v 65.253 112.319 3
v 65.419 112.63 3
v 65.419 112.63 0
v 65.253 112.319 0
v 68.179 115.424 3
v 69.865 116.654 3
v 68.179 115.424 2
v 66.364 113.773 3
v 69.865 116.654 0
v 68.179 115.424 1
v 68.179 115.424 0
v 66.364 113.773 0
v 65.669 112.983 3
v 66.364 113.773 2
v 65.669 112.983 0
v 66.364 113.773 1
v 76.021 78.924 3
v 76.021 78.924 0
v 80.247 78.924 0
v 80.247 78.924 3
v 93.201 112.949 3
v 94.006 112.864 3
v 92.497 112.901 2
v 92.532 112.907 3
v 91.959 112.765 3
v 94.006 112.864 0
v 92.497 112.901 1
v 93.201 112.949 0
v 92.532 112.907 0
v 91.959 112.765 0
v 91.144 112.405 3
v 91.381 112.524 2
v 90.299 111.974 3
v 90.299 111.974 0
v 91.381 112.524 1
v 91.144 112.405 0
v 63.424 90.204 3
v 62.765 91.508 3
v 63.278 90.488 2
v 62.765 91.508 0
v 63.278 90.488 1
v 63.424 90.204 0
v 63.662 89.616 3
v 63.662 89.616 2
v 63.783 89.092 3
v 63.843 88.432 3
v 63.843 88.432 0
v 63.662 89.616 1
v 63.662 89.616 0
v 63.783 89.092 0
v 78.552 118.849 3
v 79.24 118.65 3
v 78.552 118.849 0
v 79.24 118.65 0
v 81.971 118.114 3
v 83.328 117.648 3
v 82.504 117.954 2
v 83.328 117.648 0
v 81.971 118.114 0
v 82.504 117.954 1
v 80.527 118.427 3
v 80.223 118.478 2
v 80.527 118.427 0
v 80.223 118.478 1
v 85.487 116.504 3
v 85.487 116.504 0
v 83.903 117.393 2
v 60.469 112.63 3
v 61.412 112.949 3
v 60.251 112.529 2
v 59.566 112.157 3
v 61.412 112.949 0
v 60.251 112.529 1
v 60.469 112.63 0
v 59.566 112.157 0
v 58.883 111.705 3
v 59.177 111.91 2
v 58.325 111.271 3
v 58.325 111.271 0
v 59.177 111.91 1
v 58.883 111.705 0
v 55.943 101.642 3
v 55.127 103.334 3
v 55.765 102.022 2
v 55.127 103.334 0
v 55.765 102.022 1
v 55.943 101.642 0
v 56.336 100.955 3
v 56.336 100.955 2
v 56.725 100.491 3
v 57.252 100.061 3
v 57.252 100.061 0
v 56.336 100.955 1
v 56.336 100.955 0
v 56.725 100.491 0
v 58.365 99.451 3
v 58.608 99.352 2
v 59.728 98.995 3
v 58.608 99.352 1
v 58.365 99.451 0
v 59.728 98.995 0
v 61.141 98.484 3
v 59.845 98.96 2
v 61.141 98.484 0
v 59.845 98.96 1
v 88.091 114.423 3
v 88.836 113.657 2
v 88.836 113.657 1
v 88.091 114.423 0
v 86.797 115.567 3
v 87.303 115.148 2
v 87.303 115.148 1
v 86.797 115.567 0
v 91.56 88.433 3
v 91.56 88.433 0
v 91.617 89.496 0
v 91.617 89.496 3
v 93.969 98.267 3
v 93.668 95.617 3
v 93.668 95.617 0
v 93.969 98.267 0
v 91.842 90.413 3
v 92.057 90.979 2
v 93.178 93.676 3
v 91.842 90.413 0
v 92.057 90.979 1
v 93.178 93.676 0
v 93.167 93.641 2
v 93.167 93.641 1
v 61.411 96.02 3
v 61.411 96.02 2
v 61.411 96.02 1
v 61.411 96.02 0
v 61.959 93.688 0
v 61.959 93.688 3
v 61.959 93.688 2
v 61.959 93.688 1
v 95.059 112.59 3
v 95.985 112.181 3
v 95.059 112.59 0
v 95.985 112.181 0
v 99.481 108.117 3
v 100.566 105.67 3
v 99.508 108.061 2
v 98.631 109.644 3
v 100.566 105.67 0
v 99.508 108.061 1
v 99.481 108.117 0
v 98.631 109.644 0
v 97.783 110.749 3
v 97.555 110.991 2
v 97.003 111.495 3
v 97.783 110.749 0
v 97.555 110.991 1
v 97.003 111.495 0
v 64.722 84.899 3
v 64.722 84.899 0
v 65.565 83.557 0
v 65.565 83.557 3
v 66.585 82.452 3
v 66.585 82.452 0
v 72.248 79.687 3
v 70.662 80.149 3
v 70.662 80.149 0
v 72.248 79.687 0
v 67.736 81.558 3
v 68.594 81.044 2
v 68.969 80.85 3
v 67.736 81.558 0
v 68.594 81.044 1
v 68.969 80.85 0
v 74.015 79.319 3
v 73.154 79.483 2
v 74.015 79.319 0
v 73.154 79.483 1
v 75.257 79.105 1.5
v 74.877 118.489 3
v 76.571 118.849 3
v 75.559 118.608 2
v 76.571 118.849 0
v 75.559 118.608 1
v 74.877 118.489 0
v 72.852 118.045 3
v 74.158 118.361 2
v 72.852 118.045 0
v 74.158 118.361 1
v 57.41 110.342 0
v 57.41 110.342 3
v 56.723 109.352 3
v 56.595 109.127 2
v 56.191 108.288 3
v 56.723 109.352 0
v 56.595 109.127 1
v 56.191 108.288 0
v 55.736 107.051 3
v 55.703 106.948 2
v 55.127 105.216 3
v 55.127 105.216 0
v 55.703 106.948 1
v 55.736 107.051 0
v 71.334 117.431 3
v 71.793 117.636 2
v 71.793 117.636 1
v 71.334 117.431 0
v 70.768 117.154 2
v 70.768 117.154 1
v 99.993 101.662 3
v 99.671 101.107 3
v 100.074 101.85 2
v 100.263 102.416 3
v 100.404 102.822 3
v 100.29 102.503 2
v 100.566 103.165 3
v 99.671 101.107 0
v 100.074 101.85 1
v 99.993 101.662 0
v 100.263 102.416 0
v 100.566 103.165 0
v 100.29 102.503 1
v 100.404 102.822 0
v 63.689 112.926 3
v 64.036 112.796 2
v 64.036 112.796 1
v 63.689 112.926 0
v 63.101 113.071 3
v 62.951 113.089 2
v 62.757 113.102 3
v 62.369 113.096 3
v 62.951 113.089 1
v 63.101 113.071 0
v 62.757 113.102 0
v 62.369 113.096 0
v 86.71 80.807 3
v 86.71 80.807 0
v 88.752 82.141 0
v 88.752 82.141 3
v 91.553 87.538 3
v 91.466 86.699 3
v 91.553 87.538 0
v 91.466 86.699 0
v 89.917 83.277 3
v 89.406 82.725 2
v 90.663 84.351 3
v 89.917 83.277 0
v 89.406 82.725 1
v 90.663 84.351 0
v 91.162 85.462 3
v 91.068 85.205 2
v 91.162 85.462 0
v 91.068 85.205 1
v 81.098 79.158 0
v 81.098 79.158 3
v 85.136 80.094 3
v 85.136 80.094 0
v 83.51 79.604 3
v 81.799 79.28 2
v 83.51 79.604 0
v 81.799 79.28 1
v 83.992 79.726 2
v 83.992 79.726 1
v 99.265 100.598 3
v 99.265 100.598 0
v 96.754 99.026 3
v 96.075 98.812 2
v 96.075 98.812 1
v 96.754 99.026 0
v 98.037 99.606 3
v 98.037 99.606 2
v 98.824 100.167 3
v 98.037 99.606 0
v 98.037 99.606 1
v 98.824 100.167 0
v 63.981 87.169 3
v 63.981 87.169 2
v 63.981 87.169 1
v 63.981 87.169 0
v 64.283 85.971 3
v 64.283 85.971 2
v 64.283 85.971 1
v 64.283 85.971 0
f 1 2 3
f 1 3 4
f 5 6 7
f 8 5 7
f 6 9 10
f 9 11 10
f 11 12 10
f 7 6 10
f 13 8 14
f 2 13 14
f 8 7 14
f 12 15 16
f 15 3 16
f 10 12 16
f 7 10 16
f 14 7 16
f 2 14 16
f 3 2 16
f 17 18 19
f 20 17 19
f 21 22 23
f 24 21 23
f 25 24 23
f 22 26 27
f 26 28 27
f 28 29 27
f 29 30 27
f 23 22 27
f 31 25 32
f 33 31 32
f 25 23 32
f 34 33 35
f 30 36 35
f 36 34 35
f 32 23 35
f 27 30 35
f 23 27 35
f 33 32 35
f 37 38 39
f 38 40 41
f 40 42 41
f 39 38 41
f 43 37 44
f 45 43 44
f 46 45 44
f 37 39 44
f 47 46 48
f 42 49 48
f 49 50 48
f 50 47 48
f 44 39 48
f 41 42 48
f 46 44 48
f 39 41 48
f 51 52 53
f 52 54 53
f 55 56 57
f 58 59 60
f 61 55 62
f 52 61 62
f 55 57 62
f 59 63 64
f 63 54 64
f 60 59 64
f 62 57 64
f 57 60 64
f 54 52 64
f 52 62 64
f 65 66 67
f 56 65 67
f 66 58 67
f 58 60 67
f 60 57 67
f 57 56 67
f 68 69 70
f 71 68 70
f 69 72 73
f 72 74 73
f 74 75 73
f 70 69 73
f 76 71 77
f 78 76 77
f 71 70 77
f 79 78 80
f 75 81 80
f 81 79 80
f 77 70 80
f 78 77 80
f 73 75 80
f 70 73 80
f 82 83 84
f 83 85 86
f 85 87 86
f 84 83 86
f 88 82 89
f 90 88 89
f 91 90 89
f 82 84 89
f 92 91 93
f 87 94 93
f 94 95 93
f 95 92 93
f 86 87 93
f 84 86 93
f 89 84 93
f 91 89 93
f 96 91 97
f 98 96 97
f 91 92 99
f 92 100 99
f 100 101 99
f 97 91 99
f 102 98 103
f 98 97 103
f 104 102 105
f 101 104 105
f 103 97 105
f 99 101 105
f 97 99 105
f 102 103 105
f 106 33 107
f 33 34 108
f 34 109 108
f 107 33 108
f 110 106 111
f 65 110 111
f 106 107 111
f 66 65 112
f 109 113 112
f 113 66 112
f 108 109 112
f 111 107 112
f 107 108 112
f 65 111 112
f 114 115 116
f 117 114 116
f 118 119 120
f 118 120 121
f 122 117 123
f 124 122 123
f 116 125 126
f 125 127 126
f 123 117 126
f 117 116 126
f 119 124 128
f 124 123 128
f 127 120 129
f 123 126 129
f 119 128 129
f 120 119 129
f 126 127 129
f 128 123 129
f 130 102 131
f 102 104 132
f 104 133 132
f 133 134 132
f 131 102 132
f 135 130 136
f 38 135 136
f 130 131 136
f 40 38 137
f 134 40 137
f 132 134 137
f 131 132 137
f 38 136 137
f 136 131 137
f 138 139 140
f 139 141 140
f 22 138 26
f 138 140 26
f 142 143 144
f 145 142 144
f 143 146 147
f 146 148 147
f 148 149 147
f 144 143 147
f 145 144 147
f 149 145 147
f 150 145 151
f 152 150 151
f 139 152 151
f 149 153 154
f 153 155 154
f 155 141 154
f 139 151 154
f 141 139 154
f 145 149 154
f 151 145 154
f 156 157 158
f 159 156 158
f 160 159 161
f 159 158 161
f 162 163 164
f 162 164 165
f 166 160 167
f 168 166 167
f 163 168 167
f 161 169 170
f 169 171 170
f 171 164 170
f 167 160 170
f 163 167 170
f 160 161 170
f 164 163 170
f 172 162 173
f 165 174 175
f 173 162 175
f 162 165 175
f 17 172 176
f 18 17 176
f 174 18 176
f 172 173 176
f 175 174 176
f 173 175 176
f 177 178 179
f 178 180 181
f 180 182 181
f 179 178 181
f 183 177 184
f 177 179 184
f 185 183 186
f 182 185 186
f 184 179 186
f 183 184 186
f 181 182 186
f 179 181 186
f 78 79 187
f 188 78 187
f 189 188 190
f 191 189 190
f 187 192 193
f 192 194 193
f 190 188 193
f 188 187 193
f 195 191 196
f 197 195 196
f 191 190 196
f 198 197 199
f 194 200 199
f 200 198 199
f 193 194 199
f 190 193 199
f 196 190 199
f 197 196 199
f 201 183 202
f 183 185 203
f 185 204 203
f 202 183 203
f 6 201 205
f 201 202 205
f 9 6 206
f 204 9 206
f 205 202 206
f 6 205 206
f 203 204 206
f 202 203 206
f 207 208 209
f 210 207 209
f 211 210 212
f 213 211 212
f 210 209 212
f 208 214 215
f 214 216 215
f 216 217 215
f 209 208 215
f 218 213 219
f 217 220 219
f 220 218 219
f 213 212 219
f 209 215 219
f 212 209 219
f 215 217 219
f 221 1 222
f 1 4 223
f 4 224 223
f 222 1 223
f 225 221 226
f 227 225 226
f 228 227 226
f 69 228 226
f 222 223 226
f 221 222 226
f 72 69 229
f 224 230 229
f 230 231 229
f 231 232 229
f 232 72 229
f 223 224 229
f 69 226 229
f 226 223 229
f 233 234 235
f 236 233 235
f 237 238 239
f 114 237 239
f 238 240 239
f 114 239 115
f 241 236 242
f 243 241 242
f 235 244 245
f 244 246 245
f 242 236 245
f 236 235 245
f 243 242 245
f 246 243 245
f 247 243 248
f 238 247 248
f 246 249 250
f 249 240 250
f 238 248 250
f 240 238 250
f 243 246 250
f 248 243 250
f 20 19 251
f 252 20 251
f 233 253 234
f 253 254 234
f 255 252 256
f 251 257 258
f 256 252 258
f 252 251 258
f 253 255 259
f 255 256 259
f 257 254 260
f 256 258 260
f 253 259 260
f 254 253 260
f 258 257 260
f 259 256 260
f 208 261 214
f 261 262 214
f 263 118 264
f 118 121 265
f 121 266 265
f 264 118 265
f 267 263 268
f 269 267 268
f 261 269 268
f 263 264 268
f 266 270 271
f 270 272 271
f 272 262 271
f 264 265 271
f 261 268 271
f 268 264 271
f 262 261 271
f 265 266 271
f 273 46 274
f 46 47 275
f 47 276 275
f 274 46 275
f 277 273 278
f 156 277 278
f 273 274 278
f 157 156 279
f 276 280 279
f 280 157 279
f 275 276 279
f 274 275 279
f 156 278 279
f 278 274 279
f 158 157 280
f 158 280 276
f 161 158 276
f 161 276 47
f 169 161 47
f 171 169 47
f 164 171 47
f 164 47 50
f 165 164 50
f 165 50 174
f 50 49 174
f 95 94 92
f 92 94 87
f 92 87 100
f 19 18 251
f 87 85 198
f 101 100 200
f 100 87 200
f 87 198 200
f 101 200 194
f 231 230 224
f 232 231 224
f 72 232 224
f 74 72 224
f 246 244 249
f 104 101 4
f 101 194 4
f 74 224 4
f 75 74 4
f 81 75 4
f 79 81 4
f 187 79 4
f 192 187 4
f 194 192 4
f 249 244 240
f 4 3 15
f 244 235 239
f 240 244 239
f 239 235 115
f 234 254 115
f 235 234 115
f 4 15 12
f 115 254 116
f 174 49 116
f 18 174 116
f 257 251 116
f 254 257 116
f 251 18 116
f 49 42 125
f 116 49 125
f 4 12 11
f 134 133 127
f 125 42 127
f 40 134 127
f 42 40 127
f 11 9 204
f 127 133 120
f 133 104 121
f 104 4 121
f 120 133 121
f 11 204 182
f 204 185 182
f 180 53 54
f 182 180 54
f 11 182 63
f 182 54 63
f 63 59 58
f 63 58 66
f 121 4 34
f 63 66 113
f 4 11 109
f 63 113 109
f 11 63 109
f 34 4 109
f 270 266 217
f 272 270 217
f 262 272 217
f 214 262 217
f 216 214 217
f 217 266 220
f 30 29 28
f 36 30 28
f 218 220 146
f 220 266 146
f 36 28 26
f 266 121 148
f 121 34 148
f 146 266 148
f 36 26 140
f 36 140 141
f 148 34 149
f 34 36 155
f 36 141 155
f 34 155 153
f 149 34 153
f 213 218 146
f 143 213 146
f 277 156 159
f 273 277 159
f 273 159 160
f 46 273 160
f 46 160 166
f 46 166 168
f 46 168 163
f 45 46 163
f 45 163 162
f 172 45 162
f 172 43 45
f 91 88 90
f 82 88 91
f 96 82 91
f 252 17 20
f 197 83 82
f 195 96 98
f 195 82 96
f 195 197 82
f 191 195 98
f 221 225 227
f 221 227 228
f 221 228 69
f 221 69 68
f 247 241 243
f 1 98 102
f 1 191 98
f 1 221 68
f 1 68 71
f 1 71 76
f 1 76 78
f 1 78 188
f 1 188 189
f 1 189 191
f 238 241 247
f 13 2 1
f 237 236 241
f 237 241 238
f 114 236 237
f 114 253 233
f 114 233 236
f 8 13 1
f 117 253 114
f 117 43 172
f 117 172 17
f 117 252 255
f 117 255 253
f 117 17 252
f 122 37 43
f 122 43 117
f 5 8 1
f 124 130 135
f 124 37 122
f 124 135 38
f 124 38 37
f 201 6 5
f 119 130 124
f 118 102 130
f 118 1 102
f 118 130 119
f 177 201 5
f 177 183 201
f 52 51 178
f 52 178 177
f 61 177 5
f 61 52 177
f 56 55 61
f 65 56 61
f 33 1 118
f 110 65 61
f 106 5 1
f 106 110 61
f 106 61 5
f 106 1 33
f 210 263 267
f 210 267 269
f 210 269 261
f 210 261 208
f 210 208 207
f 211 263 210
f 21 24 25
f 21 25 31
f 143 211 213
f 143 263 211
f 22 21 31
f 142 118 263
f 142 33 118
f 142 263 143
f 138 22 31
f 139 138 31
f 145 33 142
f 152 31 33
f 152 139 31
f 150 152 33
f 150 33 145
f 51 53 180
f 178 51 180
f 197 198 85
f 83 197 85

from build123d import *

# Parameters (mm, degrees)
BOSS_EXTRUDE1_DEPTH = 3


with BuildPart() as part:
    # Model → Boss-Extrude1 (new body)
    with BuildSketch(Plane.XY):
        with BuildLine():
            Line((55.1272, 105.2165), (55.1272, 103.3338))
            add(Edge.make_bspline(
                [(55.1272, 103.3338), (55.9357, 101.875), (56.0272, 100.8916), (57.2517, 100.0613)],
                knots=[0.038461538, 0.038461538, 0.038461538, 0.038461538, 0.076923077, 0.076923077, 0.076923077, 0.076923077], degree=3))
            add(Edge.make_bspline(
                [(57.2517, 100.0613), (58.7272, 99.0608), (59.7559, 99.1354), (61.1406, 98.4843)],
                knots=[0.076923077, 0.076923077, 0.076923077, 0.076923077, 0.115384615, 0.115384615, 0.115384615, 0.115384615], degree=3))
            add(Edge.make_bspline(
                [(61.1406, 98.4843), (61.2643, 95.9602), (61.838, 93.6047), (62.7653, 91.5083)],
                knots=[0.115384615, 0.115384615, 0.115384615, 0.115384615, 0.153846154, 0.153846154, 0.153846154, 0.153846154], degree=3))
            add(Edge.make_bspline(
                [(62.7653, 91.5083), (63.3171, 90.261), (63.7888, 89.9265), (63.8434, 88.4315)],
                knots=[0.153846154, 0.153846154, 0.153846154, 0.153846154, 0.192307692, 0.192307692, 0.192307692, 0.192307692], degree=3))
            add(Edge.make_bspline(
                [(63.8434, 88.4315), (63.8899, 87.1583), (64.224, 85.8877), (64.7219, 84.8986)],
                knots=[0.192307692, 0.192307692, 0.192307692, 0.192307692, 0.230769231, 0.230769231, 0.230769231, 0.230769231], degree=3))
            add(Edge.make_bspline(
                [(64.7219, 84.8986), (67.4566, 79.4661), (74.7931, 79.4131), (76.0211, 78.9235)],
                knots=[0.230769231, 0.230769231, 0.230769231, 0.230769231, 0.269230769, 0.269230769, 0.269230769, 0.269230769], degree=3))
            Line((76.0211, 78.9235), (80.2468, 78.9235))
            add(Edge.make_bspline(
                [(80.2468, 78.9235), (81.4396, 79.4171), (83.7679, 79.2274), (86.7105, 80.8069)],
                knots=[0.307692308, 0.307692308, 0.307692308, 0.307692308, 0.346153846, 0.346153846, 0.346153846, 0.346153846], degree=3))
            add(Edge.make_bspline(
                [(86.7105, 80.8069), (89.8776, 82.5068), (91.6976, 84.7693), (91.5598, 88.4331)],
                knots=[0.346153846, 0.346153846, 0.346153846, 0.346153846, 0.384615385, 0.384615385, 0.384615385, 0.384615385], degree=3))
            add(Edge.make_bspline(
                [(91.5598, 88.4331), (91.4432, 91.536), (93.6274, 92.0439), (93.9689, 98.2668)],
                knots=[0.384615385, 0.384615385, 0.384615385, 0.384615385, 0.423076923, 0.423076923, 0.423076923, 0.423076923], degree=3))
            add(Edge.make_bspline(
                [(93.9689, 98.2668), (96.0863, 98.8396), (98.2608, 99.0994), (99.6714, 101.1074)],
                knots=[0.423076923, 0.423076923, 0.423076923, 0.423076923, 0.461538462, 0.461538462, 0.461538462, 0.461538462], degree=3))
            add(Edge.make_bspline(
                [(99.6714, 101.1074), (100.2485, 101.9289), (100.1784, 102.4641), (100.5659, 103.1647)],
                knots=[0.461538462, 0.461538462, 0.461538462, 0.461538462, 0.5, 0.5, 0.5, 0.5], degree=3))
            Line((100.5659, 103.1647), (100.5659, 105.6703))
            add(Edge.make_bspline(
                [(100.5659, 105.6703), (99.7223, 107.2591), (98.5859, 112.0519), (94.0061, 112.8642)],
                knots=[0.538461538, 0.538461538, 0.538461538, 0.538461538, 0.576923077, 0.576923077, 0.576923077, 0.576923077], degree=3))
            add(Edge.make_bspline(
                [(94.0061, 112.8642), (92.18, 113.1882), (91.4848, 112.5304), (90.2994, 111.974)],
                knots=[0.576923077, 0.576923077, 0.576923077, 0.576923077, 0.615384615, 0.615384615, 0.615384615, 0.615384615], degree=3))
            add(Edge.make_bspline(
                [(90.2994, 111.974), (88.7995, 113.7706), (87.5152, 115.1976), (85.4874, 116.5045)],
                knots=[0.615384615, 0.615384615, 0.615384615, 0.615384615, 0.653846154, 0.653846154, 0.653846154, 0.653846154], degree=3))
            add(Edge.make_bspline(
                [(85.4874, 116.5045), (82.1232, 118.6728), (79.9482, 118.2978), (78.5521, 118.8487)],
                knots=[0.653846154, 0.653846154, 0.653846154, 0.653846154, 0.692307692, 0.692307692, 0.692307692, 0.692307692], degree=3))
            Line((78.5521, 118.8487), (76.5707, 118.8487))
            add(Edge.make_bspline(
                [(76.5707, 118.8487), (75.9147, 118.5898), (73.949, 118.4167), (72.8515, 118.0451)],
                knots=[0.730769231, 0.730769231, 0.730769231, 0.730769231, 0.769230769, 0.769230769, 0.769230769, 0.769230769], degree=3))
            add(Edge.make_bspline(
                [(72.8515, 118.0451), (71.807, 117.6915), (70.6758, 117.1447), (69.865, 116.6538)],
                knots=[0.769230769, 0.769230769, 0.769230769, 0.769230769, 0.807692308, 0.807692308, 0.807692308, 0.807692308], degree=3))
            add(Edge.make_bspline(
                [(69.865, 116.6538), (68.5207, 115.84), (65.7355, 113.4696), (65.2526, 112.3186)],
                knots=[0.807692308, 0.807692308, 0.807692308, 0.807692308, 0.846153846, 0.846153846, 0.846153846, 0.846153846], degree=3))
            add(Edge.make_bspline(
                [(65.2526, 112.3186), (63.7751, 112.8048), (63.3732, 113.3887), (61.4119, 112.9491)],
                knots=[0.846153846, 0.846153846, 0.846153846, 0.846153846, 0.884615385, 0.884615385, 0.884615385, 0.884615385], degree=3))
            add(Edge.make_bspline(
                [(61.4119, 112.9491), (60.2523, 112.6892), (59.0201, 111.8593), (58.3253, 111.2712)],
                knots=[0.884615385, 0.884615385, 0.884615385, 0.884615385, 0.923076923, 0.923076923, 0.923076923, 0.923076923], degree=3))
            add(Edge.make_bspline(
                [(58.3253, 111.2712), (56.0021, 109.3047), (55.7198, 106.5647), (55.1272, 105.2165)],
                knots=[0.923076923, 0.923076923, 0.923076923, 0.923076923, 1, 1, 1, 1], degree=3))
        make_face()
    extrude(amount=BOSS_EXTRUDE1_DEPTH)


solid = part.part
